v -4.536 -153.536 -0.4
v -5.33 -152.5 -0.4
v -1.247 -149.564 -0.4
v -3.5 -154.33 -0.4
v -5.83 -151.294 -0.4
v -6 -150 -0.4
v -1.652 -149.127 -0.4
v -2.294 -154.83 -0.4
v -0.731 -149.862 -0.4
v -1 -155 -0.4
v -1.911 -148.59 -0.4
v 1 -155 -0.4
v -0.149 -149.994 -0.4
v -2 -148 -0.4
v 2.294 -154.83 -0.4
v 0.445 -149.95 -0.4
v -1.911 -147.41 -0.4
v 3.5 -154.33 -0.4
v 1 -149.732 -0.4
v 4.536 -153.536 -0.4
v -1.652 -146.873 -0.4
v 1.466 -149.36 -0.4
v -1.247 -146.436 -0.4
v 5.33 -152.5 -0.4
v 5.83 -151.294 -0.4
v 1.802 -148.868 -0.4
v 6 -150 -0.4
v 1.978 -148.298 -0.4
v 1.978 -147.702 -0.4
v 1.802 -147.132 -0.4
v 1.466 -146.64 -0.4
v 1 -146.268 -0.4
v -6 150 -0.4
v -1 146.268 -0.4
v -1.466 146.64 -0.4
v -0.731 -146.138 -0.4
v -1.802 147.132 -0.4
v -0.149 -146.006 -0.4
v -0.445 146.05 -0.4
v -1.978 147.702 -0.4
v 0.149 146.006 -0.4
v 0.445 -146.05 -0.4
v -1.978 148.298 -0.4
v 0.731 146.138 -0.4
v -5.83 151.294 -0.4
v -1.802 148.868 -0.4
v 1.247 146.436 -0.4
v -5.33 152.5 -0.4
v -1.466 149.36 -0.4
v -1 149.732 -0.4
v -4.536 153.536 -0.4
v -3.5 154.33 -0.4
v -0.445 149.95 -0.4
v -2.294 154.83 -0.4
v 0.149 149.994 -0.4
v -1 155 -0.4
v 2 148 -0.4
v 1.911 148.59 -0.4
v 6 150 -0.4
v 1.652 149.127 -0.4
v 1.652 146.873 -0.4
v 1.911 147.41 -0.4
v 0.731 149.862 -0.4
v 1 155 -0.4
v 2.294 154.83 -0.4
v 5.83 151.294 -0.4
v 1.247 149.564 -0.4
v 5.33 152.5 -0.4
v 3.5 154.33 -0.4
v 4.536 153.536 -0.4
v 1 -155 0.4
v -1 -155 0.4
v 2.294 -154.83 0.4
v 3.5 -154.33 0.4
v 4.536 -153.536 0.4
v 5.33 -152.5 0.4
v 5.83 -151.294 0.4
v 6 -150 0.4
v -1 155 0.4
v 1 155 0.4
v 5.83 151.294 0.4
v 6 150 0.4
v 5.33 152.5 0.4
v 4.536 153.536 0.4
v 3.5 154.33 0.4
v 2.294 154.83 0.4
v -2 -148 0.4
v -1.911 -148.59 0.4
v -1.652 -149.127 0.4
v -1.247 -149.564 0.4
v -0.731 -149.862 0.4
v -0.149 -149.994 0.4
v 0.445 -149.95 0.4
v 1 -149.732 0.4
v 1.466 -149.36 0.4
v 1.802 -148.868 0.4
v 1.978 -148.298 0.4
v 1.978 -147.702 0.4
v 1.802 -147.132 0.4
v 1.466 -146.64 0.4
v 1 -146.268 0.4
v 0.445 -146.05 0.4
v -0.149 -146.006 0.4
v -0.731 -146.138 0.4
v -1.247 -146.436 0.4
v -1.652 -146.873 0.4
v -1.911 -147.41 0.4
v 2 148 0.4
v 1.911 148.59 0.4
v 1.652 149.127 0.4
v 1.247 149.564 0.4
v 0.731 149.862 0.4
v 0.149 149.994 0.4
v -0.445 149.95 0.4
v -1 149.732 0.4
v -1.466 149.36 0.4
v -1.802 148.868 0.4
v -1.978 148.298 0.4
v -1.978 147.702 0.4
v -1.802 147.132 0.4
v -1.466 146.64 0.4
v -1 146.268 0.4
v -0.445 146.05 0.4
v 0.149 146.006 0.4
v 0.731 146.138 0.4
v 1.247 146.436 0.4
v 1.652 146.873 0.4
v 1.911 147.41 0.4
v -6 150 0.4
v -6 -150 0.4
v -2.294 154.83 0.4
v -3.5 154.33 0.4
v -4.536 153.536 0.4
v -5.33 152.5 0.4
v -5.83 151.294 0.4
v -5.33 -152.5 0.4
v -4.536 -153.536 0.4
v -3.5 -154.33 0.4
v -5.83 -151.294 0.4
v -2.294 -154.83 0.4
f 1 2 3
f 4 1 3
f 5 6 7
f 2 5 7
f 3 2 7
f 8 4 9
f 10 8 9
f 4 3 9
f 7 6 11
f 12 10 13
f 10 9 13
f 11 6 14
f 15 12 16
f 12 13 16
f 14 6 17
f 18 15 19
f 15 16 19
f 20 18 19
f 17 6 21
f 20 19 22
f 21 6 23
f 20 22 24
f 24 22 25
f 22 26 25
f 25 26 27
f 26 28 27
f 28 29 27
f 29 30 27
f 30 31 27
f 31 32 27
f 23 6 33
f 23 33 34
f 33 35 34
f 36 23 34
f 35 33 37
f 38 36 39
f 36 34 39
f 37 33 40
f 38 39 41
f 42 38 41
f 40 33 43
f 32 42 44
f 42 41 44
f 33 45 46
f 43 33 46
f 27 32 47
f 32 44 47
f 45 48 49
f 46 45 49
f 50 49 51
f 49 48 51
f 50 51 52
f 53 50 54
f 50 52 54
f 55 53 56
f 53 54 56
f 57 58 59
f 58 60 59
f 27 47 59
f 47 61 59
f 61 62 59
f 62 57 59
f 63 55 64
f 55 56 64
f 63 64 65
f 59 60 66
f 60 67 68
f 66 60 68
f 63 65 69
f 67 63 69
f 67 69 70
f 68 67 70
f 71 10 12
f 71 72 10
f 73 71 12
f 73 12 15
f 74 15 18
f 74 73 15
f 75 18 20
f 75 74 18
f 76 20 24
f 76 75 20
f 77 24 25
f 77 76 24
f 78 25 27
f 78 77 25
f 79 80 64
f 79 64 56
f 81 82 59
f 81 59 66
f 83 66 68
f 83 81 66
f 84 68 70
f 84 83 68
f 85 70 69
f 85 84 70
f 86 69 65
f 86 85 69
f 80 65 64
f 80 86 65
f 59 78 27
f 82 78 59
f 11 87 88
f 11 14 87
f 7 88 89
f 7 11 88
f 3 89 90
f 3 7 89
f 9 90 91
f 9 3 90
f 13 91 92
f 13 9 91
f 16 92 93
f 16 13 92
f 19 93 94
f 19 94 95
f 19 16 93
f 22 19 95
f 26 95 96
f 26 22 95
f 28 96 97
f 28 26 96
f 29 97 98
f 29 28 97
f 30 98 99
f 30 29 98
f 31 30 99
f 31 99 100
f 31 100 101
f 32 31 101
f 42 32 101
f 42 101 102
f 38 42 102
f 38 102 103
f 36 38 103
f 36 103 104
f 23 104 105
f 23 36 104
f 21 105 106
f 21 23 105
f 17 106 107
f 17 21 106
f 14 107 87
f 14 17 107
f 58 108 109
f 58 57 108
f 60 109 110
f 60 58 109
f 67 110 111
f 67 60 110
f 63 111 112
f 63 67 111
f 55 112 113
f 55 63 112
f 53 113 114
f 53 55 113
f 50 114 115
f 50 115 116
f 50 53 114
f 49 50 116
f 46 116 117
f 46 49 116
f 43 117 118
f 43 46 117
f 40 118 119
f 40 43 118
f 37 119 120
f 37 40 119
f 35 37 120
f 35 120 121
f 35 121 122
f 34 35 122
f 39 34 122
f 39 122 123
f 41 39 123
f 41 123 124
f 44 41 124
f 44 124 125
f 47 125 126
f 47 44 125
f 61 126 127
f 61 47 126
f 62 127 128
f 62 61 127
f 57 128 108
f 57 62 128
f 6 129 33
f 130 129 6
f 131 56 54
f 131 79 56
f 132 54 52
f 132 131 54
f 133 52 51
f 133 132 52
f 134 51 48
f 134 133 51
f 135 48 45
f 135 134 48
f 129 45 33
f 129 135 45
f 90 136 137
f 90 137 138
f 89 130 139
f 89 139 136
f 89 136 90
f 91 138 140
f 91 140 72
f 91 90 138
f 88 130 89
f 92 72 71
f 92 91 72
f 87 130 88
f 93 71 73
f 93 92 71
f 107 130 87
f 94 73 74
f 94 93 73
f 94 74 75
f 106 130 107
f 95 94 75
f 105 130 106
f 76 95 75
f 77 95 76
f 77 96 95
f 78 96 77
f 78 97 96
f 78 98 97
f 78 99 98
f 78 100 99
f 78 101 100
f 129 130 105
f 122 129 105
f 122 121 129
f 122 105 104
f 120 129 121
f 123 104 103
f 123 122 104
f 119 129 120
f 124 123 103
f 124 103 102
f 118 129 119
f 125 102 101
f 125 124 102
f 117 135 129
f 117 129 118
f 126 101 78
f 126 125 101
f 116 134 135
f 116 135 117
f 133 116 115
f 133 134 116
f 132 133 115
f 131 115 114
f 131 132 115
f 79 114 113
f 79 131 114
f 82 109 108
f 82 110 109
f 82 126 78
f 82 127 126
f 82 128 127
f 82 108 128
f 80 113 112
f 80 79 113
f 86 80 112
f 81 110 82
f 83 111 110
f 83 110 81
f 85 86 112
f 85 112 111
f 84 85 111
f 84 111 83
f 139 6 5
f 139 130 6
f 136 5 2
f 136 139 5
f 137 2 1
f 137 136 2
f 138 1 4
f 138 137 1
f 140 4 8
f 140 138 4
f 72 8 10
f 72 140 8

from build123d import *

# Parameters (mm, degrees)
CROQUIS1_R              = 2
SALIENTE_EXTRUIR1_DEPTH = 0.4


with BuildPart() as part:
    # Croquis1 → Saliente-Extruir1 (new, symmetric)
    with BuildSketch(Plane.XY):
        with BuildLine():
            Line((-1, -155), (1, -155))
            ThreePointArc((1, -155), (4.535533906, -153.535533906), (6, -150))
            Line((6, -150), (6, 150))
            ThreePointArc((6, 150), (4.535533906, 153.535533906), (1, 155))
            Line((1, 155), (-1, 155))
            ThreePointArc((-1, 155), (-4.535533906, 153.535533906), (-6, 150))
            Line((-6, 150), (-6, -150))
            ThreePointArc((-6, -150), (-4.535533906, -153.535533906), (-1, -155))
        make_face()
        with Locations((0, 148)):
            Circle(CROQUIS1_R, mode=Mode.SUBTRACT)
        with Locations(Location((0, -148, 0), (0, 0, 180))):
            Circle(CROQUIS1_R, mode=Mode.SUBTRACT)
    extrude(amount=SALIENTE_EXTRUIR1_DEPTH, both=True)


solid = part.part
